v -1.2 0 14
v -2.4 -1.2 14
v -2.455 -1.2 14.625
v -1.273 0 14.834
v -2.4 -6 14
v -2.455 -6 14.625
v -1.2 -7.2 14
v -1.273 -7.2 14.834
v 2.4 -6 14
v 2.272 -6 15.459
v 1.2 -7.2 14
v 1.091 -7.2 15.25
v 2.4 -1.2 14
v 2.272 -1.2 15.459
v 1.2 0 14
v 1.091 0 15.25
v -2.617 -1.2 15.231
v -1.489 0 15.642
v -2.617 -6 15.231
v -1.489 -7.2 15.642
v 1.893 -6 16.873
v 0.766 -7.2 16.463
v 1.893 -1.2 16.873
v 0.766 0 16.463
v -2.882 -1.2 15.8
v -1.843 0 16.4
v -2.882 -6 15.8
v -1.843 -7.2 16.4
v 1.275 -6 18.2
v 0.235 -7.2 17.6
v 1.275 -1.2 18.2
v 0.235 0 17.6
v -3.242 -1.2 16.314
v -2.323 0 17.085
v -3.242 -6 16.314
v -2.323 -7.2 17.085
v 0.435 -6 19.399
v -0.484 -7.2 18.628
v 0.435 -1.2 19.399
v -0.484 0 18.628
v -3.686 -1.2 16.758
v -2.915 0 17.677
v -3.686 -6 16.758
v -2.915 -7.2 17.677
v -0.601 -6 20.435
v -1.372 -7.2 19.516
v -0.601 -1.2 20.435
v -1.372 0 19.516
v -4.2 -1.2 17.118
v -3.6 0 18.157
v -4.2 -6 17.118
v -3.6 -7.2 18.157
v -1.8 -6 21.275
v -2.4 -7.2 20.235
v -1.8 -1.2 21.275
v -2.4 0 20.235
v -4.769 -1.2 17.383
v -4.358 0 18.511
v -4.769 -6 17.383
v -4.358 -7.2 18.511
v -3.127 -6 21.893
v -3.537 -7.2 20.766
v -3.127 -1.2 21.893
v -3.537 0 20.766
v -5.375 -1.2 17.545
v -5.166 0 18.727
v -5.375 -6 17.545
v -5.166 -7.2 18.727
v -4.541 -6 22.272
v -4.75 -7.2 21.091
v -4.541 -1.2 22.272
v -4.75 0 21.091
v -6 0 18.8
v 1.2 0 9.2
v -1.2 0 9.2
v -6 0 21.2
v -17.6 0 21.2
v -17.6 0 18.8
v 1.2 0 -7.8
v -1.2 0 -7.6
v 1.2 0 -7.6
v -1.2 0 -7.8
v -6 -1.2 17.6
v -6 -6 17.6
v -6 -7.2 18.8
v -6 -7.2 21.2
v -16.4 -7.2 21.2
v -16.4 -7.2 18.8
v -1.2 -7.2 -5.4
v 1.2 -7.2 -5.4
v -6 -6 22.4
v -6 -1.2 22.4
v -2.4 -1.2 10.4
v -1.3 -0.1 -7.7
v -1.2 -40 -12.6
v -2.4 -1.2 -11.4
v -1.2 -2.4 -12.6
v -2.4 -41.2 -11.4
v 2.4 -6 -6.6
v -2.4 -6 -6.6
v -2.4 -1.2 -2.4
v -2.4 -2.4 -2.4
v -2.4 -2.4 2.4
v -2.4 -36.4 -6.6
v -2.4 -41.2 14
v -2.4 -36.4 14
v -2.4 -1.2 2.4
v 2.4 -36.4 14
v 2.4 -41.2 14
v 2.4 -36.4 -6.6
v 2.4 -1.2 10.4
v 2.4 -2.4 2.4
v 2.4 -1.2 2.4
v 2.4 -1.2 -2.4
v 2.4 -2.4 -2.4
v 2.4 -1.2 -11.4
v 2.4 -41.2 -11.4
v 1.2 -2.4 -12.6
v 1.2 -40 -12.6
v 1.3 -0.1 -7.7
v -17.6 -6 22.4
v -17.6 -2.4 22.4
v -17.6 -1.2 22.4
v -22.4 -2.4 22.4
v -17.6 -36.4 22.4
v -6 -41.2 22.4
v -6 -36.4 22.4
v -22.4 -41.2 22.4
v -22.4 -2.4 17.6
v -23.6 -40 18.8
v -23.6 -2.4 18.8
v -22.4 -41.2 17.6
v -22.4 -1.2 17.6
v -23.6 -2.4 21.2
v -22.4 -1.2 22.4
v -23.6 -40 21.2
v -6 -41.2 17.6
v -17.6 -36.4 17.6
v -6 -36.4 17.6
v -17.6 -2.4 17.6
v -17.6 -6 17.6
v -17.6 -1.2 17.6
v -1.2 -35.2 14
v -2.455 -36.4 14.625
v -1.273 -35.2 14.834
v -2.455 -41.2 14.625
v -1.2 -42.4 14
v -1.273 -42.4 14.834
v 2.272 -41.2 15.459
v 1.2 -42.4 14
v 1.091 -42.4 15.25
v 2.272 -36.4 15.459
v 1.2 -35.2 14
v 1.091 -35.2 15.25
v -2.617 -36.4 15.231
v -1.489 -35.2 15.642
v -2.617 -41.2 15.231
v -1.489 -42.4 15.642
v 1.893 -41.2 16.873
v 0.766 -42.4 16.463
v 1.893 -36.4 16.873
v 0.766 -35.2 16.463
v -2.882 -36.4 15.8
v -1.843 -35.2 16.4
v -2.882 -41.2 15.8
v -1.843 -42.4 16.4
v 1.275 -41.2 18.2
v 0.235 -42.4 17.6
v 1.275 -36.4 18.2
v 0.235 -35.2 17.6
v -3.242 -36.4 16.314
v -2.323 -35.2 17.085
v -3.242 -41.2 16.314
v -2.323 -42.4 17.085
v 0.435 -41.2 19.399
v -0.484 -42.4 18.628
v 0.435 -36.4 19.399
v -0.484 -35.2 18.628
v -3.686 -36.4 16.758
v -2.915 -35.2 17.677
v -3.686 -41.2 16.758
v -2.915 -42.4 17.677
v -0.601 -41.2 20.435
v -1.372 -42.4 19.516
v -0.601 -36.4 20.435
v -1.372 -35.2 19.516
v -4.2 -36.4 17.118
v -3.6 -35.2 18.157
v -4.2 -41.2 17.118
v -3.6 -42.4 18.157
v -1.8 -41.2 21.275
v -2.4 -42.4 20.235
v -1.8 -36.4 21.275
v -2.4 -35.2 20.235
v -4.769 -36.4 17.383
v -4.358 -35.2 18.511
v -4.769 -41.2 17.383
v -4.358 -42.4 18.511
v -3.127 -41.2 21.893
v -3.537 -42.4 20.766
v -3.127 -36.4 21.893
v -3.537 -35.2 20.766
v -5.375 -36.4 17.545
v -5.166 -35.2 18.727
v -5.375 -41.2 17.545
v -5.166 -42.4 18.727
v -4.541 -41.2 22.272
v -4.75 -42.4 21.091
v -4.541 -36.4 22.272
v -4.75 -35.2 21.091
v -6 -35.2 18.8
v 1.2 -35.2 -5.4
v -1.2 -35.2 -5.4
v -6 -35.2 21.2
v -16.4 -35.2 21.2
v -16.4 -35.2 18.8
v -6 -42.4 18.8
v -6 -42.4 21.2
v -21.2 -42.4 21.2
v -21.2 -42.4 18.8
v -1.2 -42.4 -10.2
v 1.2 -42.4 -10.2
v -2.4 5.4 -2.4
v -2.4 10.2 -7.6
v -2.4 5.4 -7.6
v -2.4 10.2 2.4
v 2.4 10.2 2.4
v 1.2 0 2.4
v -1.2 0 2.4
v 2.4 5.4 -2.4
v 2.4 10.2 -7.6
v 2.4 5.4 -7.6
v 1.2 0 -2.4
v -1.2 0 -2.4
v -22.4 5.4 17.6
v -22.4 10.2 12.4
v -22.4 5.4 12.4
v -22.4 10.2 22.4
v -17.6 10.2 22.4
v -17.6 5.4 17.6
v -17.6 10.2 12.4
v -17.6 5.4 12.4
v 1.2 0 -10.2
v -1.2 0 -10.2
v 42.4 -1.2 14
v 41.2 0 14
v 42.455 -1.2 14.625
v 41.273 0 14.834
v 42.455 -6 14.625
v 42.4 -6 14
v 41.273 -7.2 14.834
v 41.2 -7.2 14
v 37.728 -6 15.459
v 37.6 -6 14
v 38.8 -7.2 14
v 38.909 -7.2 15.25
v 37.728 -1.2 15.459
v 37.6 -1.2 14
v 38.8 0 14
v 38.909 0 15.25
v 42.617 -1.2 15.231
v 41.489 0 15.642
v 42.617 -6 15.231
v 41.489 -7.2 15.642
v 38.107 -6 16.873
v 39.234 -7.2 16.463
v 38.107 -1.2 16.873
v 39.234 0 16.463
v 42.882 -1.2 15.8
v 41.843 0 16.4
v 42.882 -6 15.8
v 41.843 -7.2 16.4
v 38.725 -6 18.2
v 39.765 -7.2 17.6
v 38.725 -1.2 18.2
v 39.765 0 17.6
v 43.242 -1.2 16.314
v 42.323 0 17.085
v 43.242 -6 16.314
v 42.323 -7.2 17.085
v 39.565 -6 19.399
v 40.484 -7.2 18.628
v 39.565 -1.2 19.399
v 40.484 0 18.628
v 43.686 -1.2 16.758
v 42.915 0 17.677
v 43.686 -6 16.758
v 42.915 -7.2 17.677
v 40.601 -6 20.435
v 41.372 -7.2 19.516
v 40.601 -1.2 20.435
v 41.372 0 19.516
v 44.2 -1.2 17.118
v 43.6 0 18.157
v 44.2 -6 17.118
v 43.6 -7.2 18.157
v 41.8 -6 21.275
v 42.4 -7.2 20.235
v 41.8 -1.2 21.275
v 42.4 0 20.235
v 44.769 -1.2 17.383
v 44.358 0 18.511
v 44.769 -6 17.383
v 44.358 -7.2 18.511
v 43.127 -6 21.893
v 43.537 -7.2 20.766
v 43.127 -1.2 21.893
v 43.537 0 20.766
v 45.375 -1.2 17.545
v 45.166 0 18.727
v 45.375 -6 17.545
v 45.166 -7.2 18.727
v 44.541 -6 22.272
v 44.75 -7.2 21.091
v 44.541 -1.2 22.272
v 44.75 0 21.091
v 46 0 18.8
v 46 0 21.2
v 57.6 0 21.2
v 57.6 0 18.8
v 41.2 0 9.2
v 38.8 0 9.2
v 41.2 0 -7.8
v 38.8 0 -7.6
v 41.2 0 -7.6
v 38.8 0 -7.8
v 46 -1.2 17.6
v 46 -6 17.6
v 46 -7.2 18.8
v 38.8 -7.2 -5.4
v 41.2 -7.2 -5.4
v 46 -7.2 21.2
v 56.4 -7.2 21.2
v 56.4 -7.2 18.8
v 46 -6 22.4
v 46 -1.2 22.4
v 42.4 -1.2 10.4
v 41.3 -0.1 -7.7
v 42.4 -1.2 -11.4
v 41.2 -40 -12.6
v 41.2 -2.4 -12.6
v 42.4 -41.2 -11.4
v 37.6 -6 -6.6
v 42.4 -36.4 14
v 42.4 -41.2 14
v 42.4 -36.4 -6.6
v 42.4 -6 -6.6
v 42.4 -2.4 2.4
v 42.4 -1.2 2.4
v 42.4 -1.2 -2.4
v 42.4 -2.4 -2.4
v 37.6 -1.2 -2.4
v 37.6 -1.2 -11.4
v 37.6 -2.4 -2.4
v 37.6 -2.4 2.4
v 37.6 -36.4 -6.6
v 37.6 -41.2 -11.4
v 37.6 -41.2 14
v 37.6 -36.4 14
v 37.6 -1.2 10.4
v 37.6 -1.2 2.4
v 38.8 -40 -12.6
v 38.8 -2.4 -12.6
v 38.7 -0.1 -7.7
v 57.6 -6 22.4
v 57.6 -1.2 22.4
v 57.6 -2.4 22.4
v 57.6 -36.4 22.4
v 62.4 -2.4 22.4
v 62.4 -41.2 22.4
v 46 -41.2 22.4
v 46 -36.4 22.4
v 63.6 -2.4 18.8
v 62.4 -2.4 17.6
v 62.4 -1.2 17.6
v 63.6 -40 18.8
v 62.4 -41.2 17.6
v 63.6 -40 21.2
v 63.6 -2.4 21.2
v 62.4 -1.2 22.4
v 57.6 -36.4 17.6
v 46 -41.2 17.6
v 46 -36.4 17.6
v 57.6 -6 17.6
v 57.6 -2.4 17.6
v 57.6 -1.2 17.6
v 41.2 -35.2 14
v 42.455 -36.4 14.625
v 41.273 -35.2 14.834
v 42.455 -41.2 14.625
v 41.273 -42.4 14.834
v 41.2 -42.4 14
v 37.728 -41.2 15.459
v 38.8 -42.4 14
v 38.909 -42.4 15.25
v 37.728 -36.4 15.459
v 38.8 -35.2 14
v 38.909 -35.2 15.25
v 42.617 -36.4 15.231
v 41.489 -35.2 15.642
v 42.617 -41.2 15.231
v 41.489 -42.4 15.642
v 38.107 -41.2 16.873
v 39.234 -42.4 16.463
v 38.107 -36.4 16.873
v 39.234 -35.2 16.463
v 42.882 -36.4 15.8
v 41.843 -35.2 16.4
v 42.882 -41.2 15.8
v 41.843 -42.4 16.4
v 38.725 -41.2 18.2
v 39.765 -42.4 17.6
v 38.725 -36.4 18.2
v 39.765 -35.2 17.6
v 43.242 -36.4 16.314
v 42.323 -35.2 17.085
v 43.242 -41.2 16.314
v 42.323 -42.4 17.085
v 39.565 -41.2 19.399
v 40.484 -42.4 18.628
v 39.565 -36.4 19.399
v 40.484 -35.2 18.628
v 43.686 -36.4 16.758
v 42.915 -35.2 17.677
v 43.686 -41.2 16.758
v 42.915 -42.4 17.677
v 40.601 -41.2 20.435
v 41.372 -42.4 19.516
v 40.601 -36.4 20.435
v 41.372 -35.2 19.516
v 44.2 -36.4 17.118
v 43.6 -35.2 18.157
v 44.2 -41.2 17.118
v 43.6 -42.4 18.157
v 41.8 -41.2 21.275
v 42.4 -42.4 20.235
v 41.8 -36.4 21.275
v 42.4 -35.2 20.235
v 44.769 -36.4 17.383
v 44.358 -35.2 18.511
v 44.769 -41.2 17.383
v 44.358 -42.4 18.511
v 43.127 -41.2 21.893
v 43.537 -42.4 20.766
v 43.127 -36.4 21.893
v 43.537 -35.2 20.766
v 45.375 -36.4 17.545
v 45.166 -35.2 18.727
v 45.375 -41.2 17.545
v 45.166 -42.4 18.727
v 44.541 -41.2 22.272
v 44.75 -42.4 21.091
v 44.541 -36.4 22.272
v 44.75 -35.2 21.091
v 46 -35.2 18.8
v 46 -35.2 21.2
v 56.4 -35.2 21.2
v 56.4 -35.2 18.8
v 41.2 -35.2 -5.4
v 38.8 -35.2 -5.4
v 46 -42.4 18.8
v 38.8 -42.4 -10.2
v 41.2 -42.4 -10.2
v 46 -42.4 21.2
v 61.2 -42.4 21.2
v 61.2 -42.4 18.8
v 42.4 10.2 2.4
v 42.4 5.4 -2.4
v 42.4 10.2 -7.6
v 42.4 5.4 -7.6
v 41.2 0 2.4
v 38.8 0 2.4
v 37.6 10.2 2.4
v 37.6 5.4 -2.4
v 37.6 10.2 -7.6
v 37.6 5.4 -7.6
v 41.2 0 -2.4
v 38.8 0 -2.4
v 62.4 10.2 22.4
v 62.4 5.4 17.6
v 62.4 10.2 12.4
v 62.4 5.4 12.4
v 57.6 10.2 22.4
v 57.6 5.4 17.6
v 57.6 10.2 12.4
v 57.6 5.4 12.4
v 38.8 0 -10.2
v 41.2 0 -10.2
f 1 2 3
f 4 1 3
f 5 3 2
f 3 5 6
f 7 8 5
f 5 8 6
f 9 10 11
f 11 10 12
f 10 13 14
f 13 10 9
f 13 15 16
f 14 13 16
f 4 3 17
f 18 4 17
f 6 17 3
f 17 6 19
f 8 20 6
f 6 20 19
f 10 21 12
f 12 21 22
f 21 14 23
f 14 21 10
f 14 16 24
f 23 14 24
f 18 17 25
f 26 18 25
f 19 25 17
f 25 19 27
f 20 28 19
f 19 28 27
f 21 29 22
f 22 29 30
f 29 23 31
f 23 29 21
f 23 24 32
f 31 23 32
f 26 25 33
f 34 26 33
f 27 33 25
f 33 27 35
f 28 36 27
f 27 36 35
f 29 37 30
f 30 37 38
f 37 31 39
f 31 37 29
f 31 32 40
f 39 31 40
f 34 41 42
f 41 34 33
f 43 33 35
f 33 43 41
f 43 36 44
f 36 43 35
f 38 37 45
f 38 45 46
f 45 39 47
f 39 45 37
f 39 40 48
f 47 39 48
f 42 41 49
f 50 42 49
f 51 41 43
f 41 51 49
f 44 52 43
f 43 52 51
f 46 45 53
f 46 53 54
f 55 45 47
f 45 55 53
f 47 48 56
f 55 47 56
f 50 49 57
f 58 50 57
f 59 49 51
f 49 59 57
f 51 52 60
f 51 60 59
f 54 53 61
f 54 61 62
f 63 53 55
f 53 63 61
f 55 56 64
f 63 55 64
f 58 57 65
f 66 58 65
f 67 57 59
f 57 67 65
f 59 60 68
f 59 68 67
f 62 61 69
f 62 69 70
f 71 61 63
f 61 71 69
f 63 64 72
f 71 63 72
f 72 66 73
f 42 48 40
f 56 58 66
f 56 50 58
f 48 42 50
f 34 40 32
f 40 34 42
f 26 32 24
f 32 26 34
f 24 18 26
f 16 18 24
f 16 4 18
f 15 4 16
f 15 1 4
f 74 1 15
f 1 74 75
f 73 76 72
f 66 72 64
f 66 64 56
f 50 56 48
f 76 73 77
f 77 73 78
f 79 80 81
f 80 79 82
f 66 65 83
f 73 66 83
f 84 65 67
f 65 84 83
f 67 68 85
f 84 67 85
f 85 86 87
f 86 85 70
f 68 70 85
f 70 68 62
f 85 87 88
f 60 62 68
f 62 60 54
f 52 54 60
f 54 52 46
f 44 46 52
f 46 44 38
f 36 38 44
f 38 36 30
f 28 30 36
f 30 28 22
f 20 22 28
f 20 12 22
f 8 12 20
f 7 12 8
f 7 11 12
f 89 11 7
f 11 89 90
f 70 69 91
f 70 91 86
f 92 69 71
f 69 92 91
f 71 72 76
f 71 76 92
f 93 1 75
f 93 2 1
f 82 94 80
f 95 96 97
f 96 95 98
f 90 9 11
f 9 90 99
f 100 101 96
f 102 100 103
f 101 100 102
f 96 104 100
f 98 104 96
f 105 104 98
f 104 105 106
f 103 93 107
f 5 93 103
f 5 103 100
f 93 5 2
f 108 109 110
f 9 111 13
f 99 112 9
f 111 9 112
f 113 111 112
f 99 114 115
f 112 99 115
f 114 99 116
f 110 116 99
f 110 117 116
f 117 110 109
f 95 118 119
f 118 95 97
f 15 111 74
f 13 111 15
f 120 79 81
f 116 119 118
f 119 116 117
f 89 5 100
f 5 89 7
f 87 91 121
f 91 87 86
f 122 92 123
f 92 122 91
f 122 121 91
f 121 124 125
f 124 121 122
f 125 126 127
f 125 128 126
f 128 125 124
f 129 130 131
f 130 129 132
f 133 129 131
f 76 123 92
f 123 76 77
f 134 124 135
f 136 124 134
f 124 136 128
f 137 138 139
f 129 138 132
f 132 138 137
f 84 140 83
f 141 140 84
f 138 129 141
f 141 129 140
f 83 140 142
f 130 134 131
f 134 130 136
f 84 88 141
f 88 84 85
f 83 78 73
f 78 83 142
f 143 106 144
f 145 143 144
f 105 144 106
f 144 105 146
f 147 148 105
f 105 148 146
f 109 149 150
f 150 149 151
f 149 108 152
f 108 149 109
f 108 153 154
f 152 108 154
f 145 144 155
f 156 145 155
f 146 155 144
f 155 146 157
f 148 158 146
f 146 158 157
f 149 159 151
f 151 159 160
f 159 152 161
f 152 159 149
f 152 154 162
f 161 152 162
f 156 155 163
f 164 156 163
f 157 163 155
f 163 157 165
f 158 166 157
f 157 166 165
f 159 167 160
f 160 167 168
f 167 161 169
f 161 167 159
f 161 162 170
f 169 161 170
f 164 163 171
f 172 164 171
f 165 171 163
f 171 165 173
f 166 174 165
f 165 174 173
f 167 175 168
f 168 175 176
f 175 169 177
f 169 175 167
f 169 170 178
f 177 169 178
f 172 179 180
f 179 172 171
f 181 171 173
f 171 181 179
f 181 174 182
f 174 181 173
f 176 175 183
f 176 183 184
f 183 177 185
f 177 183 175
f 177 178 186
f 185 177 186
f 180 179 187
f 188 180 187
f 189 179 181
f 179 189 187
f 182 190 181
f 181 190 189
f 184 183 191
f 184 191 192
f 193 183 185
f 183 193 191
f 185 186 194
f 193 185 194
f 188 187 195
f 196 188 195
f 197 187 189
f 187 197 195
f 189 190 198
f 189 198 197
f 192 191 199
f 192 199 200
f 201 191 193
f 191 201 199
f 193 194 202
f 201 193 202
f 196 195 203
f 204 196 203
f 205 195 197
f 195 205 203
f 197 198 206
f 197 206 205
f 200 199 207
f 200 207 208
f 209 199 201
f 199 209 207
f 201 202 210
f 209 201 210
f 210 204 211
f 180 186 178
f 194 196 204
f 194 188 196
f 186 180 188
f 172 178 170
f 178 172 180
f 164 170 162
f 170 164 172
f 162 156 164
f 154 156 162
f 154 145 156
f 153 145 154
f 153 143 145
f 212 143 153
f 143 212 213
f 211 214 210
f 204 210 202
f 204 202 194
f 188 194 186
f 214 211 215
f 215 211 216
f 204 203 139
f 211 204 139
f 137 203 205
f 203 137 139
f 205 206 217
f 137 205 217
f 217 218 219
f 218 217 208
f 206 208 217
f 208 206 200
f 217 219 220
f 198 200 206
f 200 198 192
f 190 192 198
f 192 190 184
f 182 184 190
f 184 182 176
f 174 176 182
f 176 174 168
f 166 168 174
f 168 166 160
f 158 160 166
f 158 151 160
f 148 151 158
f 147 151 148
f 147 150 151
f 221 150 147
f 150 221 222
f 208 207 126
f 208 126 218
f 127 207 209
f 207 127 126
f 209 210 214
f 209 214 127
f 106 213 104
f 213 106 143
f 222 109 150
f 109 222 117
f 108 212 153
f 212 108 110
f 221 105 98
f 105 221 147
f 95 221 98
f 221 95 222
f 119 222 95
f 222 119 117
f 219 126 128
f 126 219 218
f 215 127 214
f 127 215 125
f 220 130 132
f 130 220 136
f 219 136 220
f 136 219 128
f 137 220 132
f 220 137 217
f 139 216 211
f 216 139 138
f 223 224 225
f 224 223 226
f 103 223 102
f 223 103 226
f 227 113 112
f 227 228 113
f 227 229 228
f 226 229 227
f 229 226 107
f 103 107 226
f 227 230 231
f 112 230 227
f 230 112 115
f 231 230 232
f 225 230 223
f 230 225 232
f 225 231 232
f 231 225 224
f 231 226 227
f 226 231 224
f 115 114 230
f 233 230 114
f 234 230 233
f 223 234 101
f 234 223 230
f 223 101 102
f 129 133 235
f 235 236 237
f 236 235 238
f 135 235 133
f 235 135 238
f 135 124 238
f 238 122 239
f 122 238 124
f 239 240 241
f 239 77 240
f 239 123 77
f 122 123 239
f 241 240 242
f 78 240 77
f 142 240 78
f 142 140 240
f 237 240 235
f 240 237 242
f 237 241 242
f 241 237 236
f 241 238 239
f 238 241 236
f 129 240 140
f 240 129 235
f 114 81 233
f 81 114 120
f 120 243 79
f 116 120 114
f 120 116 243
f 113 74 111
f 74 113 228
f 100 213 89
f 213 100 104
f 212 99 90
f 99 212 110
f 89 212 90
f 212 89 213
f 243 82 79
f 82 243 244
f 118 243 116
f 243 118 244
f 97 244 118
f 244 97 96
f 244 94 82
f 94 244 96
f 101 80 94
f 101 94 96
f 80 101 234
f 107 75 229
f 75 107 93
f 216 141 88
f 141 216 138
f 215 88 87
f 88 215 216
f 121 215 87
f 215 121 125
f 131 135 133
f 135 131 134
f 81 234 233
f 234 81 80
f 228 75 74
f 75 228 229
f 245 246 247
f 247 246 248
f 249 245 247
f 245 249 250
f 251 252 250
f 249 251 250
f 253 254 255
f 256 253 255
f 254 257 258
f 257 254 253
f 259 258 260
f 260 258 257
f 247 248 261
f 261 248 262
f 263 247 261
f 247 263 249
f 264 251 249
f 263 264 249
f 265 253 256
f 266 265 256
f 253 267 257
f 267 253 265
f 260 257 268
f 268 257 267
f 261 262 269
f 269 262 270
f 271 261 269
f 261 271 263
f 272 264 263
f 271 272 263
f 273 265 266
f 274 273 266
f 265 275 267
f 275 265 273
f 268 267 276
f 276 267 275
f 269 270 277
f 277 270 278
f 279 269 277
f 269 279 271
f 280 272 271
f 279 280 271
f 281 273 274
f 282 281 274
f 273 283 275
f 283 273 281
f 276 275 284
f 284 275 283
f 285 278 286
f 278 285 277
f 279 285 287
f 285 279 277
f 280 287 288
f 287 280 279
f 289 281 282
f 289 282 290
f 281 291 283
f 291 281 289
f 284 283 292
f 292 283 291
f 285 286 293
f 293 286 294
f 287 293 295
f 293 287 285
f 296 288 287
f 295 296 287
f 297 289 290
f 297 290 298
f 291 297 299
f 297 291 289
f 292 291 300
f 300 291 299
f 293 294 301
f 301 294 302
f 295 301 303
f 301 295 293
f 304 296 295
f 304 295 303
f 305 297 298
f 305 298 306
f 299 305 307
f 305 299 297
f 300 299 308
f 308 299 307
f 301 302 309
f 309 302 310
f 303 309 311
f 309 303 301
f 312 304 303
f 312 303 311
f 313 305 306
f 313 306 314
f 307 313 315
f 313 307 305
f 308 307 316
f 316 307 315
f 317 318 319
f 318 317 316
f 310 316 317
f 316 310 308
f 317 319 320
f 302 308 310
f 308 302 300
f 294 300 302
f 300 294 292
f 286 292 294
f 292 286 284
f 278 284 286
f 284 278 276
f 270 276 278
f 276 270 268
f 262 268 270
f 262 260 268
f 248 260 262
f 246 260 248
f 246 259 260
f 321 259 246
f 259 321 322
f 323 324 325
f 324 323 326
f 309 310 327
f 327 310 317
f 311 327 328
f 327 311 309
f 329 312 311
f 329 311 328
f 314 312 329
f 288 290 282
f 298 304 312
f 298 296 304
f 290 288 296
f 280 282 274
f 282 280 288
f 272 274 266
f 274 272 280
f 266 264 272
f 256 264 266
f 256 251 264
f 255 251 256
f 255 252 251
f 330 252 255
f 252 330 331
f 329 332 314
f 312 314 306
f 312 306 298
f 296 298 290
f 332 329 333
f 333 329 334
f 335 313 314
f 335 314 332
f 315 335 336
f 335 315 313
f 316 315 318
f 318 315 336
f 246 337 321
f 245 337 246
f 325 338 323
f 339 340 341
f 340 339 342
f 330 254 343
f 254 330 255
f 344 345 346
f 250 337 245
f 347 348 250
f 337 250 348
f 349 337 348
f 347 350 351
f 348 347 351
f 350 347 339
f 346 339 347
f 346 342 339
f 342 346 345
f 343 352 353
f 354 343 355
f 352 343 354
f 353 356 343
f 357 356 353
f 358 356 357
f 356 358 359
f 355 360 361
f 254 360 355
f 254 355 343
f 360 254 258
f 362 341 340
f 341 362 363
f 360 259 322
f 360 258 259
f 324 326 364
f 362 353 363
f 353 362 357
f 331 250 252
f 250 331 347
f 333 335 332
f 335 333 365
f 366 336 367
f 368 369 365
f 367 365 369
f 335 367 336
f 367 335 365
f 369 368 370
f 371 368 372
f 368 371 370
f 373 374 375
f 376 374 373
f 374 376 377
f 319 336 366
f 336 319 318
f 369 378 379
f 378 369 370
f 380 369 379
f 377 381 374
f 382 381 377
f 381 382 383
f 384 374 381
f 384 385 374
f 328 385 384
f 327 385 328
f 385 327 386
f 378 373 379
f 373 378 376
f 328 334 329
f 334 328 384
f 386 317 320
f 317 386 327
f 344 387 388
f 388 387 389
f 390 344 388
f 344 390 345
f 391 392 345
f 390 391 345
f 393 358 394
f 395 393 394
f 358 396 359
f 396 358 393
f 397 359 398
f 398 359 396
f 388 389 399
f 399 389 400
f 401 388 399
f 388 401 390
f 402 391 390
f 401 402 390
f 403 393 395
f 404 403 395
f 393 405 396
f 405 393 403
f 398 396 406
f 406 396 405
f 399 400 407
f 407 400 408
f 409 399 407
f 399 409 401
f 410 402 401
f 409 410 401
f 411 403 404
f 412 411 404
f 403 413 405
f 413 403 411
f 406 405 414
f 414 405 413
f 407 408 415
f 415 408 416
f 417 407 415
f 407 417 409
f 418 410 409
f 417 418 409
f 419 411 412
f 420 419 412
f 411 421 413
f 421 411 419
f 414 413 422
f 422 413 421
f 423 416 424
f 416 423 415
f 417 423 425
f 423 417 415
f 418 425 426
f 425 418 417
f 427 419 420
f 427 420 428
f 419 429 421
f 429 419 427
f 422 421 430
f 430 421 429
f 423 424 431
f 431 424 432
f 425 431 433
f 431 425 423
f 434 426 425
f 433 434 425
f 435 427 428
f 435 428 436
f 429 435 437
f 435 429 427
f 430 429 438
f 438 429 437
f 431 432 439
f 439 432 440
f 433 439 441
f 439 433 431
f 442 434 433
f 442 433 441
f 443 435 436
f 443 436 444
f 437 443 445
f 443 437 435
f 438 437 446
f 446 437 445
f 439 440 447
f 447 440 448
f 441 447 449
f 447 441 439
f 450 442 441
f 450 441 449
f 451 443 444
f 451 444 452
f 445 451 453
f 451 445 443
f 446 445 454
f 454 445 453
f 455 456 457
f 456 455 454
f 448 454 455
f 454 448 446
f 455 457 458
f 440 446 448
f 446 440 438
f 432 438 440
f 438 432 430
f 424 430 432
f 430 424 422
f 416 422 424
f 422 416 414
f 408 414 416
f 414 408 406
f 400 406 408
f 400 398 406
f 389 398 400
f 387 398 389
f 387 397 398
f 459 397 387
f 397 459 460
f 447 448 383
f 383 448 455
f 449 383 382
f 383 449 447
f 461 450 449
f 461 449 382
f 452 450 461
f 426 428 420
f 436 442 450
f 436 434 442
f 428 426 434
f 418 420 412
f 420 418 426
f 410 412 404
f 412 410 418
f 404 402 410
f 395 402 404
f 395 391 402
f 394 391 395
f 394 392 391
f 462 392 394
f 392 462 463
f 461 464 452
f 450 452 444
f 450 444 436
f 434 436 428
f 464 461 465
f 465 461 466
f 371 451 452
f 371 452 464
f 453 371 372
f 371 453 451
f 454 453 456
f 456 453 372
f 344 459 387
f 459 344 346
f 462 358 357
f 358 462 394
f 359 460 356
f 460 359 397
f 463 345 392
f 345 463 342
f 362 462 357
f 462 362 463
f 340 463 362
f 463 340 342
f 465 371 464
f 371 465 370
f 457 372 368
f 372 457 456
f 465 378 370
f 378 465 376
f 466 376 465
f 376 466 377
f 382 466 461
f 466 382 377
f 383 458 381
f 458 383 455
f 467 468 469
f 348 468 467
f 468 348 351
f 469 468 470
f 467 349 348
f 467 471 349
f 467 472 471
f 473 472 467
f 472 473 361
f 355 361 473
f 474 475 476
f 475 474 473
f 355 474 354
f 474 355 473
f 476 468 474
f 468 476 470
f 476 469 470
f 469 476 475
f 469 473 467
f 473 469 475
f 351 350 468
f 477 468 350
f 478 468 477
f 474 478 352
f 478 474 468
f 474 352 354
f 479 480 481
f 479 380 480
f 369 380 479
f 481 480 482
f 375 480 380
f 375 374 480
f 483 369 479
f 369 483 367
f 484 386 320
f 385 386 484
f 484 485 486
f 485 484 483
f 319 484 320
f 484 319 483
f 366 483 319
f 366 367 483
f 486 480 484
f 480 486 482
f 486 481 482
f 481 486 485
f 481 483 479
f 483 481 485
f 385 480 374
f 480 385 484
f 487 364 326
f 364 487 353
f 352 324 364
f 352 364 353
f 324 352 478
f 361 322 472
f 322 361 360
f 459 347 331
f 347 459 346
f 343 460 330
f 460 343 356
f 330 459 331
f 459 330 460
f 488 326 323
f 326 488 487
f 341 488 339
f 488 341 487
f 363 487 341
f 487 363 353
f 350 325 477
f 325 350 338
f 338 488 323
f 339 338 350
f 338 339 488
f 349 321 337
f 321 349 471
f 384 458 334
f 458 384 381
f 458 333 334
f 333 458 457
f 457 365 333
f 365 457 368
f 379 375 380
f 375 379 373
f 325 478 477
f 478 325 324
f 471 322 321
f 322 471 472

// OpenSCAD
// 穴: 5mm x 15mm
// 厚さ: 5.3mm
// 縦の距離: 40mm

fragments = 36;
is3in1B = false;
isCycleLight = false;
isPliers = false;
isMobileKeyboard = false;
isSoundPeats = false;

x = 2.4;
y = 4.8;
module p() {
    polygon([
        [x + 2.4, y],
        [x, -y],
        [-x, -y],
        [-x + 2.4, y],
        [-x + 2.4 + 1, y + 1],
        [x + 2.4 - 1, y + 1],
    ]);
}

module p2() {
    polygon([
        [2.4, 2.4],
        [2.4, -2.4],
        [-2.4, -2.4],
        [-2.4, 2.4],
        [-2.4 + 1, 2.4 + 1],
        [2.4 - 1, 2.4 + 1],
    ]);
}

module tip() {
    rotate_extrude(angle = 360, convexity = 10, $fn=fragments) {
        translate([0, 0, 0])
        polygon([
            [2.4, 2.4],
            [2.4, -2.4],
            [0, -2.4],
            [0, 2.4],
            [0, 2.4 + 1],
            [2.4 - 1, 2.4 + 1],
        ]);
    }
}

// size = [28, 3.4, 22, 1]; // モバイルバッテリー 3in1
// size = [32, 14, 6.6, 1]; // 自転車ライト
size = [28, 0, 19, 1]; // ニッパー＆ペンチ
// size = [21, 17, 51, 3]; // 折りたたみキーボード
// size = [30, 7, 26, 1]; // SoundPeats イヤホン

d = size[0];
w = size[1];
h = size[2];
hole = size[3];





if (is3in1B) {
    translate([20, -21, 20])
    #cube([78, 27, 57], center = true);
}

if (isCycleLight) {
    translate([20, -23, 20 + 2.4])
    #cube([99, 31, 31], center = true);
}

if (isPliers) {
    translate([40, -16, 0])
    #cube([80, 20, 57], center = true);
}

if (isMobileKeyboard) {
    translate([60, -17, 20])
    #cube([184, 19, 115], center = true);
}

if (isSoundPeats) {
    translate([20, -22, 20])
    #cube([85, 29, 65], center = true);
}

///////////////////////////

module poly() {
    polygon([
        [1.2, 2.4 + 1.2],
        [2.4, 1.2 + 1.2],
        [2.4, -1.2 - 1.2],
        [1.2, -2.4 - 1.2],
        [-1.2, -2.4 - 1.2],
        [-2.4, -1.2 - 1.2],
        [-2.4, 1.2 + 1.2],
        [-1.2, 2.4 + 1.2],
    ]);
}

module xyz() {
    linear_extrude(height = 4.8, center = true, convexity = 10, $fn = fragments) {
        poly();
    }
}
module abc() {
    
    intersection() {
        xyz();
        rotate([0, 90, 0])
        xyz();

    }

}
module node() {
    union() {
        abc();
        rotate([0, 0, 90])
        abc();
    }
}




module curve() {
    rotate([90, 0, 0])
    rotate_extrude(angle = 90, convexity = 10, $fn = fragments) {
        translate([6, 0, 0])
        poly();
    }
}



module fence() {

    translate([-6, 0, 14])
    curve();

    hull() {
        translate([0, 0, 12.8])
        scale([1, 1, 0.5])
        xyz();
        
        translate([0, 0, 10 - h])
        rotate([0, 90, 0])
        node();
    }

    hull() {
        translate([0 - 2.4 - 6, 0, 20])
        rotate([0, 90, 0])
        xyz();
        
        translate([-20 - w, 0, 20])
        rotate([0, 0, 0])
        node();
    }
}


module hook() {
    hull() {
        translate([0, 7.8, 0])
        cube([4.8, 4.8, 4.8], center=true);
        translate([0, 7.8, -5.2])
        cube([4.8, 4.8, 4.8], center=true);
    }
    hull() {
        translate([0, 7.8, 0])
        cube([4.8, 4.8, 4.8], center=true);
        translate([0, 0, 0])
        cube([4.8, 4.8, 4.8], center=true);
    }

}

module body() {
    hull() {
        translate([0, -3.6, 10 - h])
        rotate([0, 90, 0])
        node();
        
        translate([0, -10.8 - d, 10 - h])
        rotate([0, 90, 0])
        node();
    }


    hull() {
        translate([-20 - w, -3.6, 20])
        rotate([0, 0, 0])
        node();

        translate([-20 - w, -10.8 - d, 20])
        rotate([0, 0, 0])
        node();
    }

    translate([0, -3.6, 0])
    fence();
    hull() {
        translate([0, -3.6, 8])
        rotate([0, 90, 0])
        node();
        translate([0, -3.6, -6.4])
        rotate([0, 90, 0])
        node();
    }
    


    translate([0, -10.8 - d, 0])
    fence();

    translate([0, 0, 0])
    hook();
    translate([-20, 0, 20])
    hook();
}


body();

translate([ (hole * 40), 0, 0])
mirror([1, 0, 0])
body();
